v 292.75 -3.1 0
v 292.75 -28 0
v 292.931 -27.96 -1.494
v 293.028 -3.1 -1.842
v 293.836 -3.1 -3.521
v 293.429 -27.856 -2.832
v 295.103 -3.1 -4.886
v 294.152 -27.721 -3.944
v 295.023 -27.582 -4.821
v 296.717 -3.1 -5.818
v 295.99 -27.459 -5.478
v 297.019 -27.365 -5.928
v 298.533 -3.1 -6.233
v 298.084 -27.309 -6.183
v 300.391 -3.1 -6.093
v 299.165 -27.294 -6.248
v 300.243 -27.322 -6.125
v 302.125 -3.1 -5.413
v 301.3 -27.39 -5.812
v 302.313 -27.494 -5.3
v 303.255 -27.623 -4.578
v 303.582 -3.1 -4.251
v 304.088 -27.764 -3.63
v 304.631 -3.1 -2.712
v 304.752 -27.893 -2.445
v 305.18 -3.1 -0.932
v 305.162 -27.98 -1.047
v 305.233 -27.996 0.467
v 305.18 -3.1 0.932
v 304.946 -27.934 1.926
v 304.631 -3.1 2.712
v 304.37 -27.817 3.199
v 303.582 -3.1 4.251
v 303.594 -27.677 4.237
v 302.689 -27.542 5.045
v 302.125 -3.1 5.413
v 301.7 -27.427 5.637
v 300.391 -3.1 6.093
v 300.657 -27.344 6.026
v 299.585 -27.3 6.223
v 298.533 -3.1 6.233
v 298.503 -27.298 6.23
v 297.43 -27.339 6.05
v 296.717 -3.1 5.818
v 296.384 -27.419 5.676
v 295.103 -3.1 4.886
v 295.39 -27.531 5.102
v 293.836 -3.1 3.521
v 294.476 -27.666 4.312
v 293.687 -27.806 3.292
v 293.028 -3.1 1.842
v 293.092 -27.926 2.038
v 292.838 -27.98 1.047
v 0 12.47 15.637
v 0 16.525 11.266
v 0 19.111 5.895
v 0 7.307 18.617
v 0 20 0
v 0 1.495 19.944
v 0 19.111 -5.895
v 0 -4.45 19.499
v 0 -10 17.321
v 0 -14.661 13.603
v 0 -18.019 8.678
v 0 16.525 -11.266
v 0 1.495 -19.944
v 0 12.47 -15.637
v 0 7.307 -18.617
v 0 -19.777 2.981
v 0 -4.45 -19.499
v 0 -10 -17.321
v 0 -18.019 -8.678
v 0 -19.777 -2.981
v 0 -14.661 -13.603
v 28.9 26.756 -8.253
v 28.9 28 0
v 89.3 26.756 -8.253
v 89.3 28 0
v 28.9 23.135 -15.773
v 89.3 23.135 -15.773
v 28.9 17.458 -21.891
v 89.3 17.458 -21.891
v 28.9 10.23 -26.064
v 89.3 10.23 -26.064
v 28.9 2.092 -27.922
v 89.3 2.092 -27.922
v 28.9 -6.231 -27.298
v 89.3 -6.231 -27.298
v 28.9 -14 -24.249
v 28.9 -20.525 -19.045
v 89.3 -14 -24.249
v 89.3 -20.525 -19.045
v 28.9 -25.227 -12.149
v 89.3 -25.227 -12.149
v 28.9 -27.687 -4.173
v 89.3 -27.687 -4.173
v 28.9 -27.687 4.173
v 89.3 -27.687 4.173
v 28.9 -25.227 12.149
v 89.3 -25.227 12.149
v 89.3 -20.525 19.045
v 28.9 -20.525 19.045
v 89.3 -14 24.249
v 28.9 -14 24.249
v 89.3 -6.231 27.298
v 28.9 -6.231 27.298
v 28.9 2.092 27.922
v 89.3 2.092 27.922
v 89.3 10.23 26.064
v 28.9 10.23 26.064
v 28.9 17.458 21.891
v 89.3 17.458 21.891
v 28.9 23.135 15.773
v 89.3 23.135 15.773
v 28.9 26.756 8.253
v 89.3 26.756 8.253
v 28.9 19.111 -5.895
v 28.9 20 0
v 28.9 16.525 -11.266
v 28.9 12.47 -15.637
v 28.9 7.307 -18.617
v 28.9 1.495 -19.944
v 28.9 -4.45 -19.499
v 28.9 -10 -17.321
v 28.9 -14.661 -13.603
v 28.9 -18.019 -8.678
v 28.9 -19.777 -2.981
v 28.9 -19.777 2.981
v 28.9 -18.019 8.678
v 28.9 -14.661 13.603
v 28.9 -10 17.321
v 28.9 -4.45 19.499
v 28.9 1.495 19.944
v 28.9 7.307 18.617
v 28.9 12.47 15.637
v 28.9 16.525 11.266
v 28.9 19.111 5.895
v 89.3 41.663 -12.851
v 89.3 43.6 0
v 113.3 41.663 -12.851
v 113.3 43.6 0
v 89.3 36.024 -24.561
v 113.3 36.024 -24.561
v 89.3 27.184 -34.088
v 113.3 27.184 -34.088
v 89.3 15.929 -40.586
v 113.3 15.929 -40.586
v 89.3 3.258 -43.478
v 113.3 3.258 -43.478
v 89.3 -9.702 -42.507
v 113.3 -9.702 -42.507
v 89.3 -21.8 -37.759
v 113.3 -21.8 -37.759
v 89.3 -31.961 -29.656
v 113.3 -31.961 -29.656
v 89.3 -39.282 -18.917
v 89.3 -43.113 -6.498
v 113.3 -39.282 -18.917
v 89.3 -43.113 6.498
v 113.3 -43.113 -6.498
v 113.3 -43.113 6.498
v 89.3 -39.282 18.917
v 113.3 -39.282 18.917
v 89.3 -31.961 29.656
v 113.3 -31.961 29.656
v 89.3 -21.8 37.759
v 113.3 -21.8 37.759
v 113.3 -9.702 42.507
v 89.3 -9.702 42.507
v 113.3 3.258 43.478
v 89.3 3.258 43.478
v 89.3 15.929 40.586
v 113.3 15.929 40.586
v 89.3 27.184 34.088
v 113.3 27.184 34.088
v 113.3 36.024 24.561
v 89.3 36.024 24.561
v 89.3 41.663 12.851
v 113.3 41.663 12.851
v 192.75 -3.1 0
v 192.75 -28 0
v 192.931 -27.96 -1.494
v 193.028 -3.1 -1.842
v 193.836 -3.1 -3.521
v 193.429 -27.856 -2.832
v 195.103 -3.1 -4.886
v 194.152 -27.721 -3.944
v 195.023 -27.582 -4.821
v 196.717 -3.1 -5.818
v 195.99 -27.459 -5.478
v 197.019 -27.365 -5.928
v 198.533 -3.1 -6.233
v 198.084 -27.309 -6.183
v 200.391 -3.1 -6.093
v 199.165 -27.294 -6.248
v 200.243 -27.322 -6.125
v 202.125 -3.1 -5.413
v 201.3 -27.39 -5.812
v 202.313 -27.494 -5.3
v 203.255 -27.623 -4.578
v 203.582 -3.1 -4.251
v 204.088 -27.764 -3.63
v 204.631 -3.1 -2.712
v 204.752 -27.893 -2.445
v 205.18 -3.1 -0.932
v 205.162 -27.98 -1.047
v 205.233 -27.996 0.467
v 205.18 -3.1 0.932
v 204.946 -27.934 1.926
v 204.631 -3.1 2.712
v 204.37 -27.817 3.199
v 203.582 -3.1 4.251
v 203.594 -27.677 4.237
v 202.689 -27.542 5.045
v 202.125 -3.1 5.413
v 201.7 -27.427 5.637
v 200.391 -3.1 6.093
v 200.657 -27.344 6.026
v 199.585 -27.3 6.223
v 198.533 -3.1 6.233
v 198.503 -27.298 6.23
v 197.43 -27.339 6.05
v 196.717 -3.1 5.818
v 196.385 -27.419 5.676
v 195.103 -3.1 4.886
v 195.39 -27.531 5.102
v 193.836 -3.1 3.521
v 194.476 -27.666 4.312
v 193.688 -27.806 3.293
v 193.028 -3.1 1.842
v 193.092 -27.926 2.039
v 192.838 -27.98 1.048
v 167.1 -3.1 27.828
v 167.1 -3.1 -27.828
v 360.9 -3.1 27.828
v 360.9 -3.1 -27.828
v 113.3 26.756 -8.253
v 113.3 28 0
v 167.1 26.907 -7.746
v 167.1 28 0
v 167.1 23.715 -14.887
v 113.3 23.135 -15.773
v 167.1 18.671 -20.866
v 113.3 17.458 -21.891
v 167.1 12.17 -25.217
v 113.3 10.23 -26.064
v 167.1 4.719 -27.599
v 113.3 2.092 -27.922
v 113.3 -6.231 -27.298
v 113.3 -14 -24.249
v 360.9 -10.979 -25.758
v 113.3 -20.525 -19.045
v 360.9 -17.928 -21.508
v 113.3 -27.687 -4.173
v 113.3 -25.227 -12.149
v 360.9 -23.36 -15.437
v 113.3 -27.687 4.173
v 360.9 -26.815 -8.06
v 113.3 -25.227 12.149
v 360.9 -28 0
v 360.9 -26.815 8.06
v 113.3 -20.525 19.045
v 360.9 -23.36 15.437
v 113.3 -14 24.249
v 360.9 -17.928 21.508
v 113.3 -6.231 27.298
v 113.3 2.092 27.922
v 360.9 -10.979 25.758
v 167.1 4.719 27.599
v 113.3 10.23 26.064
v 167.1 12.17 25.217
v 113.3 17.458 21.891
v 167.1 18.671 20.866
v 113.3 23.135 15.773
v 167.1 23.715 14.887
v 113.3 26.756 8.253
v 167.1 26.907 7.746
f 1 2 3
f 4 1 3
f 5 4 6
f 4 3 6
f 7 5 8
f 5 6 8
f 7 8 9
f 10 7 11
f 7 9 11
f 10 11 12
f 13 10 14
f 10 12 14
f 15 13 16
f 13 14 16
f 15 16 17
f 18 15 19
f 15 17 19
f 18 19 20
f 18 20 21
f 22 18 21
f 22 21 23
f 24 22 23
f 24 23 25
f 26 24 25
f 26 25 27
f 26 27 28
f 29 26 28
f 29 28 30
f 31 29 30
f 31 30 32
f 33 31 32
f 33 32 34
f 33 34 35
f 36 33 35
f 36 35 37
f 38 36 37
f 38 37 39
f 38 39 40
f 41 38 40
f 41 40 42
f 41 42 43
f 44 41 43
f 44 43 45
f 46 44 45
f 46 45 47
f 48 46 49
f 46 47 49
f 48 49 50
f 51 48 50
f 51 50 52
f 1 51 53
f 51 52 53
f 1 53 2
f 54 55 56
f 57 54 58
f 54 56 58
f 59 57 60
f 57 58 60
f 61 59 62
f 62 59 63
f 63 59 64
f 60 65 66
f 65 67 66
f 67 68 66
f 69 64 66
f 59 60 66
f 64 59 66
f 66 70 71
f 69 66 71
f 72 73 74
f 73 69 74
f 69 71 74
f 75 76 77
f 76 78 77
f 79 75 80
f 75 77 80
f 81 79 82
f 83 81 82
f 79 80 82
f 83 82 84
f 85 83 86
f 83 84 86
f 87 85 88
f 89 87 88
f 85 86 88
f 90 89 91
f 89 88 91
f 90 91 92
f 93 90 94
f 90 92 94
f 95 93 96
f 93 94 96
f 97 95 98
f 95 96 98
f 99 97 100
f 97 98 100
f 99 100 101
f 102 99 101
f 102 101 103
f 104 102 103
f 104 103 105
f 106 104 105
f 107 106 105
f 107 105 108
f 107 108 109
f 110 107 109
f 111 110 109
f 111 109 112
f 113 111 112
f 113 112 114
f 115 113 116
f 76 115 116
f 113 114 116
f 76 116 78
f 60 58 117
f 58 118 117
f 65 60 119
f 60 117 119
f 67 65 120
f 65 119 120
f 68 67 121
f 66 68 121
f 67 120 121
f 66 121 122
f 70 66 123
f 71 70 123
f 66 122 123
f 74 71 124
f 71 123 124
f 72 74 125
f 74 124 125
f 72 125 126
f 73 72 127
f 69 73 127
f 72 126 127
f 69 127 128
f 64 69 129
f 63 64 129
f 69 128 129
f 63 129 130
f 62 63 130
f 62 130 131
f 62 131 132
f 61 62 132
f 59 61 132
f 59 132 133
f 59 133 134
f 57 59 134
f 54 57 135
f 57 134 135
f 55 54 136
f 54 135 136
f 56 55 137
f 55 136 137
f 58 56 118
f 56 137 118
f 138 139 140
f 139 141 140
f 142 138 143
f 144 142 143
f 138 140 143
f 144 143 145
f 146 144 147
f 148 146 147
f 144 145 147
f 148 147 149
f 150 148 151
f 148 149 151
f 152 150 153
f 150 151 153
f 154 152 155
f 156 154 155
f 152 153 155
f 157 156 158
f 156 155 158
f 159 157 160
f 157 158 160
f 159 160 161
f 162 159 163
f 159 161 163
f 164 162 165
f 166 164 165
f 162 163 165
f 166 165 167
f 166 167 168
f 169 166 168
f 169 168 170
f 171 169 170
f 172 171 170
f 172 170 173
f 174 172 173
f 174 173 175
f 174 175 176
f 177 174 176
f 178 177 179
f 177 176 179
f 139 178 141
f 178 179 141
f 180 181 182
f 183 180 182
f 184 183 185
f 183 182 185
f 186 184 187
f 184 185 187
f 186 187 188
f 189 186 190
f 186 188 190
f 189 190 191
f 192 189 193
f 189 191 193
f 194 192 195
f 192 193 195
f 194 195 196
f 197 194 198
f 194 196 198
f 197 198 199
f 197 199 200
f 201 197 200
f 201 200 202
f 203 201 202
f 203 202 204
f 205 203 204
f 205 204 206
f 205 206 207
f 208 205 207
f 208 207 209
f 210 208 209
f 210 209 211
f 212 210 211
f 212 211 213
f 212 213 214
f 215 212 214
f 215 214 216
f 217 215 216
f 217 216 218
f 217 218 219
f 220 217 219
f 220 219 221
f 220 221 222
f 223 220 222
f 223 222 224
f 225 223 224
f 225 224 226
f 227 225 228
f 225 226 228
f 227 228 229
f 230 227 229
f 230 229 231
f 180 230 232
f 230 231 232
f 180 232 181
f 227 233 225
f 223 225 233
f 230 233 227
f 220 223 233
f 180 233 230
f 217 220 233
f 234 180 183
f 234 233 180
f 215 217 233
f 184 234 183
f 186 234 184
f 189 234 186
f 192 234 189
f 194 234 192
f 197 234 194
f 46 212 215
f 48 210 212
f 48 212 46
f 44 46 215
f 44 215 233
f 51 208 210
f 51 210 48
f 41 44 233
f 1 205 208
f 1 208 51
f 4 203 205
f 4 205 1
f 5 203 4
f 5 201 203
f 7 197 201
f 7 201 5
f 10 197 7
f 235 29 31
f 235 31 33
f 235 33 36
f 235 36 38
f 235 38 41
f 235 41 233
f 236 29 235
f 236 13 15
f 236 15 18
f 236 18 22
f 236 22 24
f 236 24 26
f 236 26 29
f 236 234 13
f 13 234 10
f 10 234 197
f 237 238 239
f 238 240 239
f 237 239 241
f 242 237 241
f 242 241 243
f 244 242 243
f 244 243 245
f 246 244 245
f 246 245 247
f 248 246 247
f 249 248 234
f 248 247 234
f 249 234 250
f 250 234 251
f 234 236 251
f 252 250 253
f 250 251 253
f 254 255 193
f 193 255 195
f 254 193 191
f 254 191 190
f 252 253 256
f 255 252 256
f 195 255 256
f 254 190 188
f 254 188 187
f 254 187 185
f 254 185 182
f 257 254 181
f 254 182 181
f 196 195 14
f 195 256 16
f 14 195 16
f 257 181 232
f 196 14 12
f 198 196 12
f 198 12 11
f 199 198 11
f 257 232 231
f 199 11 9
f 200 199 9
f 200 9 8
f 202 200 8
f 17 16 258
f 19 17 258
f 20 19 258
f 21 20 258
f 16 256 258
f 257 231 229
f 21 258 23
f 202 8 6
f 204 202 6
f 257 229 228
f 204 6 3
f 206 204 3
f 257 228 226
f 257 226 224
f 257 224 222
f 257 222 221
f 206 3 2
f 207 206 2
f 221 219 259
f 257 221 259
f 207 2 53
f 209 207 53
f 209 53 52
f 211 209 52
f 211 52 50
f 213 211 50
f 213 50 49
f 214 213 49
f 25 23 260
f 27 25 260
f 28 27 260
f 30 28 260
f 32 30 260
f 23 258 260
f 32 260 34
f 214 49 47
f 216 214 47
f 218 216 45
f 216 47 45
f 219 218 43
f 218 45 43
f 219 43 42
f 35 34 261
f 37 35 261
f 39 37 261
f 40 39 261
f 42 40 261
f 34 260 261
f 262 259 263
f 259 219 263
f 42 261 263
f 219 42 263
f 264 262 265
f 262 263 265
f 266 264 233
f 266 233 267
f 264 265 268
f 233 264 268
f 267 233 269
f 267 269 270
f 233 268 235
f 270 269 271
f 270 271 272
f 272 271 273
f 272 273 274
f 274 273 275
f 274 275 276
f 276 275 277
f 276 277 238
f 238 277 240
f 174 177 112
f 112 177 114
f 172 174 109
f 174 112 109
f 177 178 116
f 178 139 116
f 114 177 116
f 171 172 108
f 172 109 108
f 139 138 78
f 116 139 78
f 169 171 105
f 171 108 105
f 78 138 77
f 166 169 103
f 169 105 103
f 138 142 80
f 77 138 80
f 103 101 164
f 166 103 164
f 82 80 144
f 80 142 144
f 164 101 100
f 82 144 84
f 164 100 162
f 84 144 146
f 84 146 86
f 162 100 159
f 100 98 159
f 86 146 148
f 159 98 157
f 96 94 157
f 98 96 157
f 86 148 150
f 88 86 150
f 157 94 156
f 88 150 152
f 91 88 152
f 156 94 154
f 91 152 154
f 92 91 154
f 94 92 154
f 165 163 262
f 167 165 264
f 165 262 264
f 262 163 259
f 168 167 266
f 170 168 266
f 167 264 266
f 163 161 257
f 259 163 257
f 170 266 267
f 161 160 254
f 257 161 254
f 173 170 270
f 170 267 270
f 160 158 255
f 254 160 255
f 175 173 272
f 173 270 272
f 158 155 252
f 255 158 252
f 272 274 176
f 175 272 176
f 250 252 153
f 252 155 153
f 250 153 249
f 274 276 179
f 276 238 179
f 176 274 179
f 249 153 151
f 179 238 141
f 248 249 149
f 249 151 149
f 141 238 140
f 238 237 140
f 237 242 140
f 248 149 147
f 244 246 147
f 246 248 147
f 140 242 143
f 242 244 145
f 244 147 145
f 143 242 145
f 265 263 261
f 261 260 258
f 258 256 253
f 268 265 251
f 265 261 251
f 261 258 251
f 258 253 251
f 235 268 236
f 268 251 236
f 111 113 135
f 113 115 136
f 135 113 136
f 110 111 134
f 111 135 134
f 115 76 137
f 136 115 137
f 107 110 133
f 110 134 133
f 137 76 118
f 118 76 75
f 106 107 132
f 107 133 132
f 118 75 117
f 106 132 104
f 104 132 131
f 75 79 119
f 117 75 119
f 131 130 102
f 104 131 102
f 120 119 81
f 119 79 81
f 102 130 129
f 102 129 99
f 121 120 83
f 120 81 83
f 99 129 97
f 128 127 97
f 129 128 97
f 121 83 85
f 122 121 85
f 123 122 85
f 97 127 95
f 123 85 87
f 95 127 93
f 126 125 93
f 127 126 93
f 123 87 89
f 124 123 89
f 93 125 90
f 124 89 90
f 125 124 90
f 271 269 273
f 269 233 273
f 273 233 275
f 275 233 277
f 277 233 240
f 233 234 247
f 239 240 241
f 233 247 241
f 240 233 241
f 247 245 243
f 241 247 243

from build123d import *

# Parameters (mm, degrees)
CUT_EXTRUDE1_DEPTH      = 367.129389697
CUT_EXTRUDE1_DEPTH_BACK = 367.129389697
SKETCH2_W               = 193.8
SKETCH2_H               = 31.1
HOLE1_D                 = 12.5


with BuildPart() as part:
    # Sketch1 → Revolve1 (revolve)
    with BuildSketch(Plane.XY):
        Polygon((0, 0), (0, 20), (28.9, 20), (28.9, 28), (89.3, 28), (89.3, 43.6), (113.3, 43.6), (113.3, 28), (360.9, 28), (360.9, 0), align=None)
    revolve(axis=Axis((360.9, 0, 0), (-1, 0, 0)))

    # Sketch2 → Cut-Extrude1 (cut, two sides: drawn at the far end of the back side and taken through both)
    with BuildSketch(Plane.XY.offset(-CUT_EXTRUDE1_DEPTH_BACK)):
        with Locations((264, 12.45)):
            Rectangle(SKETCH2_W, SKETCH2_H)
    extrude(amount=CUT_EXTRUDE1_DEPTH + CUT_EXTRUDE1_DEPTH_BACK, mode=Mode.SUBTRACT)

    # Hole1 (through all)
    with Locations(Plane(origin=(0, -3.1, 0), x_dir=(1, 0, 0), z_dir=(0, 1, 0))):
        with Locations((199, 0), (299, 0)):
            Hole(HOLE1_D / 2)


solid = part.part
